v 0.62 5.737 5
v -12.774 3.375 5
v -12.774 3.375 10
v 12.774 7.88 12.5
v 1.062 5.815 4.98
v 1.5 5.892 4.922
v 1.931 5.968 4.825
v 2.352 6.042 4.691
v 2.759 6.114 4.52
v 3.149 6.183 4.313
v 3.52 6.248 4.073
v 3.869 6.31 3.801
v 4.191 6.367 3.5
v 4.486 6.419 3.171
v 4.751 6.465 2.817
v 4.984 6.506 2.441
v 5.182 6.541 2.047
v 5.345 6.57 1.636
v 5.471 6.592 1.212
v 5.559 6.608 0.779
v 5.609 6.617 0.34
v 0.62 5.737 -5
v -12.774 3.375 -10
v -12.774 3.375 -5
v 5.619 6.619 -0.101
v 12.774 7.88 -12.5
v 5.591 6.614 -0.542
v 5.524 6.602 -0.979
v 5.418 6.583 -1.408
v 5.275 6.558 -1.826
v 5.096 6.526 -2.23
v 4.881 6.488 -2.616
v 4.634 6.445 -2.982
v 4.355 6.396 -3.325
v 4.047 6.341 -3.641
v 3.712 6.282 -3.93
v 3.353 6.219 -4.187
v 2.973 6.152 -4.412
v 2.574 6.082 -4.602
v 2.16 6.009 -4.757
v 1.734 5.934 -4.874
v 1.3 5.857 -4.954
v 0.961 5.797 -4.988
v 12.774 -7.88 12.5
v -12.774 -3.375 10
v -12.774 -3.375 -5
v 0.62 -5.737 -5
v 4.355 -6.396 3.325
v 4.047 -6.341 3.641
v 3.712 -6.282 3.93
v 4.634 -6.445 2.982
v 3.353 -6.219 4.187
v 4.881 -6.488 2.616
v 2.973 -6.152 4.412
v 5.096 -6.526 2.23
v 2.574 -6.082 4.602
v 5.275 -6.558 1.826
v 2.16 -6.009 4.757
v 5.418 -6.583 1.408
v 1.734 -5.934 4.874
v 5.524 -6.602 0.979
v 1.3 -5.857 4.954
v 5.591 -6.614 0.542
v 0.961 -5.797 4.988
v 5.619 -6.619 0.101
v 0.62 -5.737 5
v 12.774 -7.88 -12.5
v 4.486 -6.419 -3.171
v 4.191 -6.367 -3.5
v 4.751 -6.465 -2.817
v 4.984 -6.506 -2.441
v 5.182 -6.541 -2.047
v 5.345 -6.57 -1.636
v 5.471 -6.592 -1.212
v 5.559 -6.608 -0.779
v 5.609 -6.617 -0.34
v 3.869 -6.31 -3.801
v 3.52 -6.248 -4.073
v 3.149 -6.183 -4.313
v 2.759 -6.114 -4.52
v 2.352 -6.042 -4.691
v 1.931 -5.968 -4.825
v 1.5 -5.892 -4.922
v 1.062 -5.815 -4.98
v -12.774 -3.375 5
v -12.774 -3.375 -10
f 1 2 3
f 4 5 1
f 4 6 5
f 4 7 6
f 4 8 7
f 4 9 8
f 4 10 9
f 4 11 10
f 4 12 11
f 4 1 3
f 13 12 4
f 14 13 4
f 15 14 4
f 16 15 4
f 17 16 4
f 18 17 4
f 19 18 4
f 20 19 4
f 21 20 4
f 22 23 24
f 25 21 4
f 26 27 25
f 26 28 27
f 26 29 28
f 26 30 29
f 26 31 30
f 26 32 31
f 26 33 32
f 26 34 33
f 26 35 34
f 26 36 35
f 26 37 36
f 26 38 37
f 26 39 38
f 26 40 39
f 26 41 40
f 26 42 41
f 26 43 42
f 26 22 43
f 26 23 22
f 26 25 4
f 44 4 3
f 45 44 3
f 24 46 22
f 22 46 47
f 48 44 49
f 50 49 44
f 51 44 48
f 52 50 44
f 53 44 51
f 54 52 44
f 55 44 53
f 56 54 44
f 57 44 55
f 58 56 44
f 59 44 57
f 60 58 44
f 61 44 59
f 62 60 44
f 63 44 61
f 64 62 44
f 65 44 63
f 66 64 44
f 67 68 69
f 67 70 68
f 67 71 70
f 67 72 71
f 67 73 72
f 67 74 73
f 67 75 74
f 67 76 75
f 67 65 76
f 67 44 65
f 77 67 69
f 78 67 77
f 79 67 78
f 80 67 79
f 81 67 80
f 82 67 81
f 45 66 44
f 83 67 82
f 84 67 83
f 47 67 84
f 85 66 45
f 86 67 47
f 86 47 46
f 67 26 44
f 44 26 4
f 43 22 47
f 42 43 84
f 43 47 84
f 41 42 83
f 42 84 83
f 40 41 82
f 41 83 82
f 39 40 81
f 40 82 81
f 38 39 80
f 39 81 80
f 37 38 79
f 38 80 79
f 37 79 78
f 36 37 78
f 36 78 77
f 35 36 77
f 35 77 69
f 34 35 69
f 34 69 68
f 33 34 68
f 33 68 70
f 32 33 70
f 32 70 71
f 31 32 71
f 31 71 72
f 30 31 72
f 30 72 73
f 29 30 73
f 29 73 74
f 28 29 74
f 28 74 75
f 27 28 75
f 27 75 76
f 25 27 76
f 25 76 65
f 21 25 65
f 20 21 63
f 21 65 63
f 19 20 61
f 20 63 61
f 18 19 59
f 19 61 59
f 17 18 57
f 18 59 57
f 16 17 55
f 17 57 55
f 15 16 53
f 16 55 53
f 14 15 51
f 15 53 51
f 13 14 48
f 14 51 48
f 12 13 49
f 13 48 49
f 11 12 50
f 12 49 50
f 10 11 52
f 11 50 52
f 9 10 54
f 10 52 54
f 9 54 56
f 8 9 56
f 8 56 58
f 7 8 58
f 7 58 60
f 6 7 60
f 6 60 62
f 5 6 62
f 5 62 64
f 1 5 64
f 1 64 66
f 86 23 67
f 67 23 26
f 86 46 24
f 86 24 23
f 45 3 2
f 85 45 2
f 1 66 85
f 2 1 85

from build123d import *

# Parameters (mm, degrees)
BOSS_EXTRUDE1_DEPTH     = 25
CUT_EXTRUDE1_DEPTH      = 31.731494025
CUT_EXTRUDE1_DEPTH_BACK = 31.731494025
SKETCH2_OUTSIDE_W       = 39.84
SKETCH2_OUTSIDE_H       = 64.292
CUT_EXTRUDE2_DEPTH      = 20.532560663
CUT_EXTRUDE2_DEPTH_BACK = 20.532560663


with BuildPart() as part:
    # Sketch1 → Boss-Extrude1 (new, symmetric)
    with BuildSketch(Plane(origin=(0, 0, 0), x_dir=(1, 0, 0), z_dir=(0, 1, 0))):
        Polygon((-12.773986261, -10), (-12.773986261, 10), (12.773986261, 12.5), (12.773986261, -12.5), align=None)
    extrude(amount=BOSS_EXTRUDE1_DEPTH, both=True)

    # Sketch2 outside → Cut-Extrude1 (cut, two sides: drawn at the far end of the back side and taken through both)
    with BuildSketch(Plane.XY.offset(-CUT_EXTRUDE1_DEPTH_BACK)):
        Rectangle(SKETCH2_OUTSIDE_W, SKETCH2_OUTSIDE_H)
        Polygon((-12.773986261, -3.375317421), (-12.773986261, 3.375317421), (12.773986261, 7.880114279), (12.773986261, -7.880114279), align=None, mode=Mode.SUBTRACT)
    extrude(amount=CUT_EXTRUDE1_DEPTH + CUT_EXTRUDE1_DEPTH_BACK, mode=Mode.SUBTRACT)

    # Sketch3 → Cut-Extrude2 (cut, two sides: drawn at the far end of the back side and taken through both)
    with BuildSketch(Plane(origin=(0, 0, 0), x_dir=(1, 0, 0), z_dir=(0, 1, 0)).offset(-CUT_EXTRUDE2_DEPTH_BACK)):
        with BuildLine():
            Line((-17.816892232, 5), (0.620317331, 5))
            ThreePointArc((0.620317331, 5), (5.620317331, 0), (0.620317331, -5))
            Line((0.620317331, -5), (-17.816892232, -5))
            Line((-17.816892232, -5), (-17.816892232, 5))
        make_face()
    extrude(amount=CUT_EXTRUDE2_DEPTH + CUT_EXTRUDE2_DEPTH_BACK, mode=Mode.SUBTRACT)


solid = part.part
